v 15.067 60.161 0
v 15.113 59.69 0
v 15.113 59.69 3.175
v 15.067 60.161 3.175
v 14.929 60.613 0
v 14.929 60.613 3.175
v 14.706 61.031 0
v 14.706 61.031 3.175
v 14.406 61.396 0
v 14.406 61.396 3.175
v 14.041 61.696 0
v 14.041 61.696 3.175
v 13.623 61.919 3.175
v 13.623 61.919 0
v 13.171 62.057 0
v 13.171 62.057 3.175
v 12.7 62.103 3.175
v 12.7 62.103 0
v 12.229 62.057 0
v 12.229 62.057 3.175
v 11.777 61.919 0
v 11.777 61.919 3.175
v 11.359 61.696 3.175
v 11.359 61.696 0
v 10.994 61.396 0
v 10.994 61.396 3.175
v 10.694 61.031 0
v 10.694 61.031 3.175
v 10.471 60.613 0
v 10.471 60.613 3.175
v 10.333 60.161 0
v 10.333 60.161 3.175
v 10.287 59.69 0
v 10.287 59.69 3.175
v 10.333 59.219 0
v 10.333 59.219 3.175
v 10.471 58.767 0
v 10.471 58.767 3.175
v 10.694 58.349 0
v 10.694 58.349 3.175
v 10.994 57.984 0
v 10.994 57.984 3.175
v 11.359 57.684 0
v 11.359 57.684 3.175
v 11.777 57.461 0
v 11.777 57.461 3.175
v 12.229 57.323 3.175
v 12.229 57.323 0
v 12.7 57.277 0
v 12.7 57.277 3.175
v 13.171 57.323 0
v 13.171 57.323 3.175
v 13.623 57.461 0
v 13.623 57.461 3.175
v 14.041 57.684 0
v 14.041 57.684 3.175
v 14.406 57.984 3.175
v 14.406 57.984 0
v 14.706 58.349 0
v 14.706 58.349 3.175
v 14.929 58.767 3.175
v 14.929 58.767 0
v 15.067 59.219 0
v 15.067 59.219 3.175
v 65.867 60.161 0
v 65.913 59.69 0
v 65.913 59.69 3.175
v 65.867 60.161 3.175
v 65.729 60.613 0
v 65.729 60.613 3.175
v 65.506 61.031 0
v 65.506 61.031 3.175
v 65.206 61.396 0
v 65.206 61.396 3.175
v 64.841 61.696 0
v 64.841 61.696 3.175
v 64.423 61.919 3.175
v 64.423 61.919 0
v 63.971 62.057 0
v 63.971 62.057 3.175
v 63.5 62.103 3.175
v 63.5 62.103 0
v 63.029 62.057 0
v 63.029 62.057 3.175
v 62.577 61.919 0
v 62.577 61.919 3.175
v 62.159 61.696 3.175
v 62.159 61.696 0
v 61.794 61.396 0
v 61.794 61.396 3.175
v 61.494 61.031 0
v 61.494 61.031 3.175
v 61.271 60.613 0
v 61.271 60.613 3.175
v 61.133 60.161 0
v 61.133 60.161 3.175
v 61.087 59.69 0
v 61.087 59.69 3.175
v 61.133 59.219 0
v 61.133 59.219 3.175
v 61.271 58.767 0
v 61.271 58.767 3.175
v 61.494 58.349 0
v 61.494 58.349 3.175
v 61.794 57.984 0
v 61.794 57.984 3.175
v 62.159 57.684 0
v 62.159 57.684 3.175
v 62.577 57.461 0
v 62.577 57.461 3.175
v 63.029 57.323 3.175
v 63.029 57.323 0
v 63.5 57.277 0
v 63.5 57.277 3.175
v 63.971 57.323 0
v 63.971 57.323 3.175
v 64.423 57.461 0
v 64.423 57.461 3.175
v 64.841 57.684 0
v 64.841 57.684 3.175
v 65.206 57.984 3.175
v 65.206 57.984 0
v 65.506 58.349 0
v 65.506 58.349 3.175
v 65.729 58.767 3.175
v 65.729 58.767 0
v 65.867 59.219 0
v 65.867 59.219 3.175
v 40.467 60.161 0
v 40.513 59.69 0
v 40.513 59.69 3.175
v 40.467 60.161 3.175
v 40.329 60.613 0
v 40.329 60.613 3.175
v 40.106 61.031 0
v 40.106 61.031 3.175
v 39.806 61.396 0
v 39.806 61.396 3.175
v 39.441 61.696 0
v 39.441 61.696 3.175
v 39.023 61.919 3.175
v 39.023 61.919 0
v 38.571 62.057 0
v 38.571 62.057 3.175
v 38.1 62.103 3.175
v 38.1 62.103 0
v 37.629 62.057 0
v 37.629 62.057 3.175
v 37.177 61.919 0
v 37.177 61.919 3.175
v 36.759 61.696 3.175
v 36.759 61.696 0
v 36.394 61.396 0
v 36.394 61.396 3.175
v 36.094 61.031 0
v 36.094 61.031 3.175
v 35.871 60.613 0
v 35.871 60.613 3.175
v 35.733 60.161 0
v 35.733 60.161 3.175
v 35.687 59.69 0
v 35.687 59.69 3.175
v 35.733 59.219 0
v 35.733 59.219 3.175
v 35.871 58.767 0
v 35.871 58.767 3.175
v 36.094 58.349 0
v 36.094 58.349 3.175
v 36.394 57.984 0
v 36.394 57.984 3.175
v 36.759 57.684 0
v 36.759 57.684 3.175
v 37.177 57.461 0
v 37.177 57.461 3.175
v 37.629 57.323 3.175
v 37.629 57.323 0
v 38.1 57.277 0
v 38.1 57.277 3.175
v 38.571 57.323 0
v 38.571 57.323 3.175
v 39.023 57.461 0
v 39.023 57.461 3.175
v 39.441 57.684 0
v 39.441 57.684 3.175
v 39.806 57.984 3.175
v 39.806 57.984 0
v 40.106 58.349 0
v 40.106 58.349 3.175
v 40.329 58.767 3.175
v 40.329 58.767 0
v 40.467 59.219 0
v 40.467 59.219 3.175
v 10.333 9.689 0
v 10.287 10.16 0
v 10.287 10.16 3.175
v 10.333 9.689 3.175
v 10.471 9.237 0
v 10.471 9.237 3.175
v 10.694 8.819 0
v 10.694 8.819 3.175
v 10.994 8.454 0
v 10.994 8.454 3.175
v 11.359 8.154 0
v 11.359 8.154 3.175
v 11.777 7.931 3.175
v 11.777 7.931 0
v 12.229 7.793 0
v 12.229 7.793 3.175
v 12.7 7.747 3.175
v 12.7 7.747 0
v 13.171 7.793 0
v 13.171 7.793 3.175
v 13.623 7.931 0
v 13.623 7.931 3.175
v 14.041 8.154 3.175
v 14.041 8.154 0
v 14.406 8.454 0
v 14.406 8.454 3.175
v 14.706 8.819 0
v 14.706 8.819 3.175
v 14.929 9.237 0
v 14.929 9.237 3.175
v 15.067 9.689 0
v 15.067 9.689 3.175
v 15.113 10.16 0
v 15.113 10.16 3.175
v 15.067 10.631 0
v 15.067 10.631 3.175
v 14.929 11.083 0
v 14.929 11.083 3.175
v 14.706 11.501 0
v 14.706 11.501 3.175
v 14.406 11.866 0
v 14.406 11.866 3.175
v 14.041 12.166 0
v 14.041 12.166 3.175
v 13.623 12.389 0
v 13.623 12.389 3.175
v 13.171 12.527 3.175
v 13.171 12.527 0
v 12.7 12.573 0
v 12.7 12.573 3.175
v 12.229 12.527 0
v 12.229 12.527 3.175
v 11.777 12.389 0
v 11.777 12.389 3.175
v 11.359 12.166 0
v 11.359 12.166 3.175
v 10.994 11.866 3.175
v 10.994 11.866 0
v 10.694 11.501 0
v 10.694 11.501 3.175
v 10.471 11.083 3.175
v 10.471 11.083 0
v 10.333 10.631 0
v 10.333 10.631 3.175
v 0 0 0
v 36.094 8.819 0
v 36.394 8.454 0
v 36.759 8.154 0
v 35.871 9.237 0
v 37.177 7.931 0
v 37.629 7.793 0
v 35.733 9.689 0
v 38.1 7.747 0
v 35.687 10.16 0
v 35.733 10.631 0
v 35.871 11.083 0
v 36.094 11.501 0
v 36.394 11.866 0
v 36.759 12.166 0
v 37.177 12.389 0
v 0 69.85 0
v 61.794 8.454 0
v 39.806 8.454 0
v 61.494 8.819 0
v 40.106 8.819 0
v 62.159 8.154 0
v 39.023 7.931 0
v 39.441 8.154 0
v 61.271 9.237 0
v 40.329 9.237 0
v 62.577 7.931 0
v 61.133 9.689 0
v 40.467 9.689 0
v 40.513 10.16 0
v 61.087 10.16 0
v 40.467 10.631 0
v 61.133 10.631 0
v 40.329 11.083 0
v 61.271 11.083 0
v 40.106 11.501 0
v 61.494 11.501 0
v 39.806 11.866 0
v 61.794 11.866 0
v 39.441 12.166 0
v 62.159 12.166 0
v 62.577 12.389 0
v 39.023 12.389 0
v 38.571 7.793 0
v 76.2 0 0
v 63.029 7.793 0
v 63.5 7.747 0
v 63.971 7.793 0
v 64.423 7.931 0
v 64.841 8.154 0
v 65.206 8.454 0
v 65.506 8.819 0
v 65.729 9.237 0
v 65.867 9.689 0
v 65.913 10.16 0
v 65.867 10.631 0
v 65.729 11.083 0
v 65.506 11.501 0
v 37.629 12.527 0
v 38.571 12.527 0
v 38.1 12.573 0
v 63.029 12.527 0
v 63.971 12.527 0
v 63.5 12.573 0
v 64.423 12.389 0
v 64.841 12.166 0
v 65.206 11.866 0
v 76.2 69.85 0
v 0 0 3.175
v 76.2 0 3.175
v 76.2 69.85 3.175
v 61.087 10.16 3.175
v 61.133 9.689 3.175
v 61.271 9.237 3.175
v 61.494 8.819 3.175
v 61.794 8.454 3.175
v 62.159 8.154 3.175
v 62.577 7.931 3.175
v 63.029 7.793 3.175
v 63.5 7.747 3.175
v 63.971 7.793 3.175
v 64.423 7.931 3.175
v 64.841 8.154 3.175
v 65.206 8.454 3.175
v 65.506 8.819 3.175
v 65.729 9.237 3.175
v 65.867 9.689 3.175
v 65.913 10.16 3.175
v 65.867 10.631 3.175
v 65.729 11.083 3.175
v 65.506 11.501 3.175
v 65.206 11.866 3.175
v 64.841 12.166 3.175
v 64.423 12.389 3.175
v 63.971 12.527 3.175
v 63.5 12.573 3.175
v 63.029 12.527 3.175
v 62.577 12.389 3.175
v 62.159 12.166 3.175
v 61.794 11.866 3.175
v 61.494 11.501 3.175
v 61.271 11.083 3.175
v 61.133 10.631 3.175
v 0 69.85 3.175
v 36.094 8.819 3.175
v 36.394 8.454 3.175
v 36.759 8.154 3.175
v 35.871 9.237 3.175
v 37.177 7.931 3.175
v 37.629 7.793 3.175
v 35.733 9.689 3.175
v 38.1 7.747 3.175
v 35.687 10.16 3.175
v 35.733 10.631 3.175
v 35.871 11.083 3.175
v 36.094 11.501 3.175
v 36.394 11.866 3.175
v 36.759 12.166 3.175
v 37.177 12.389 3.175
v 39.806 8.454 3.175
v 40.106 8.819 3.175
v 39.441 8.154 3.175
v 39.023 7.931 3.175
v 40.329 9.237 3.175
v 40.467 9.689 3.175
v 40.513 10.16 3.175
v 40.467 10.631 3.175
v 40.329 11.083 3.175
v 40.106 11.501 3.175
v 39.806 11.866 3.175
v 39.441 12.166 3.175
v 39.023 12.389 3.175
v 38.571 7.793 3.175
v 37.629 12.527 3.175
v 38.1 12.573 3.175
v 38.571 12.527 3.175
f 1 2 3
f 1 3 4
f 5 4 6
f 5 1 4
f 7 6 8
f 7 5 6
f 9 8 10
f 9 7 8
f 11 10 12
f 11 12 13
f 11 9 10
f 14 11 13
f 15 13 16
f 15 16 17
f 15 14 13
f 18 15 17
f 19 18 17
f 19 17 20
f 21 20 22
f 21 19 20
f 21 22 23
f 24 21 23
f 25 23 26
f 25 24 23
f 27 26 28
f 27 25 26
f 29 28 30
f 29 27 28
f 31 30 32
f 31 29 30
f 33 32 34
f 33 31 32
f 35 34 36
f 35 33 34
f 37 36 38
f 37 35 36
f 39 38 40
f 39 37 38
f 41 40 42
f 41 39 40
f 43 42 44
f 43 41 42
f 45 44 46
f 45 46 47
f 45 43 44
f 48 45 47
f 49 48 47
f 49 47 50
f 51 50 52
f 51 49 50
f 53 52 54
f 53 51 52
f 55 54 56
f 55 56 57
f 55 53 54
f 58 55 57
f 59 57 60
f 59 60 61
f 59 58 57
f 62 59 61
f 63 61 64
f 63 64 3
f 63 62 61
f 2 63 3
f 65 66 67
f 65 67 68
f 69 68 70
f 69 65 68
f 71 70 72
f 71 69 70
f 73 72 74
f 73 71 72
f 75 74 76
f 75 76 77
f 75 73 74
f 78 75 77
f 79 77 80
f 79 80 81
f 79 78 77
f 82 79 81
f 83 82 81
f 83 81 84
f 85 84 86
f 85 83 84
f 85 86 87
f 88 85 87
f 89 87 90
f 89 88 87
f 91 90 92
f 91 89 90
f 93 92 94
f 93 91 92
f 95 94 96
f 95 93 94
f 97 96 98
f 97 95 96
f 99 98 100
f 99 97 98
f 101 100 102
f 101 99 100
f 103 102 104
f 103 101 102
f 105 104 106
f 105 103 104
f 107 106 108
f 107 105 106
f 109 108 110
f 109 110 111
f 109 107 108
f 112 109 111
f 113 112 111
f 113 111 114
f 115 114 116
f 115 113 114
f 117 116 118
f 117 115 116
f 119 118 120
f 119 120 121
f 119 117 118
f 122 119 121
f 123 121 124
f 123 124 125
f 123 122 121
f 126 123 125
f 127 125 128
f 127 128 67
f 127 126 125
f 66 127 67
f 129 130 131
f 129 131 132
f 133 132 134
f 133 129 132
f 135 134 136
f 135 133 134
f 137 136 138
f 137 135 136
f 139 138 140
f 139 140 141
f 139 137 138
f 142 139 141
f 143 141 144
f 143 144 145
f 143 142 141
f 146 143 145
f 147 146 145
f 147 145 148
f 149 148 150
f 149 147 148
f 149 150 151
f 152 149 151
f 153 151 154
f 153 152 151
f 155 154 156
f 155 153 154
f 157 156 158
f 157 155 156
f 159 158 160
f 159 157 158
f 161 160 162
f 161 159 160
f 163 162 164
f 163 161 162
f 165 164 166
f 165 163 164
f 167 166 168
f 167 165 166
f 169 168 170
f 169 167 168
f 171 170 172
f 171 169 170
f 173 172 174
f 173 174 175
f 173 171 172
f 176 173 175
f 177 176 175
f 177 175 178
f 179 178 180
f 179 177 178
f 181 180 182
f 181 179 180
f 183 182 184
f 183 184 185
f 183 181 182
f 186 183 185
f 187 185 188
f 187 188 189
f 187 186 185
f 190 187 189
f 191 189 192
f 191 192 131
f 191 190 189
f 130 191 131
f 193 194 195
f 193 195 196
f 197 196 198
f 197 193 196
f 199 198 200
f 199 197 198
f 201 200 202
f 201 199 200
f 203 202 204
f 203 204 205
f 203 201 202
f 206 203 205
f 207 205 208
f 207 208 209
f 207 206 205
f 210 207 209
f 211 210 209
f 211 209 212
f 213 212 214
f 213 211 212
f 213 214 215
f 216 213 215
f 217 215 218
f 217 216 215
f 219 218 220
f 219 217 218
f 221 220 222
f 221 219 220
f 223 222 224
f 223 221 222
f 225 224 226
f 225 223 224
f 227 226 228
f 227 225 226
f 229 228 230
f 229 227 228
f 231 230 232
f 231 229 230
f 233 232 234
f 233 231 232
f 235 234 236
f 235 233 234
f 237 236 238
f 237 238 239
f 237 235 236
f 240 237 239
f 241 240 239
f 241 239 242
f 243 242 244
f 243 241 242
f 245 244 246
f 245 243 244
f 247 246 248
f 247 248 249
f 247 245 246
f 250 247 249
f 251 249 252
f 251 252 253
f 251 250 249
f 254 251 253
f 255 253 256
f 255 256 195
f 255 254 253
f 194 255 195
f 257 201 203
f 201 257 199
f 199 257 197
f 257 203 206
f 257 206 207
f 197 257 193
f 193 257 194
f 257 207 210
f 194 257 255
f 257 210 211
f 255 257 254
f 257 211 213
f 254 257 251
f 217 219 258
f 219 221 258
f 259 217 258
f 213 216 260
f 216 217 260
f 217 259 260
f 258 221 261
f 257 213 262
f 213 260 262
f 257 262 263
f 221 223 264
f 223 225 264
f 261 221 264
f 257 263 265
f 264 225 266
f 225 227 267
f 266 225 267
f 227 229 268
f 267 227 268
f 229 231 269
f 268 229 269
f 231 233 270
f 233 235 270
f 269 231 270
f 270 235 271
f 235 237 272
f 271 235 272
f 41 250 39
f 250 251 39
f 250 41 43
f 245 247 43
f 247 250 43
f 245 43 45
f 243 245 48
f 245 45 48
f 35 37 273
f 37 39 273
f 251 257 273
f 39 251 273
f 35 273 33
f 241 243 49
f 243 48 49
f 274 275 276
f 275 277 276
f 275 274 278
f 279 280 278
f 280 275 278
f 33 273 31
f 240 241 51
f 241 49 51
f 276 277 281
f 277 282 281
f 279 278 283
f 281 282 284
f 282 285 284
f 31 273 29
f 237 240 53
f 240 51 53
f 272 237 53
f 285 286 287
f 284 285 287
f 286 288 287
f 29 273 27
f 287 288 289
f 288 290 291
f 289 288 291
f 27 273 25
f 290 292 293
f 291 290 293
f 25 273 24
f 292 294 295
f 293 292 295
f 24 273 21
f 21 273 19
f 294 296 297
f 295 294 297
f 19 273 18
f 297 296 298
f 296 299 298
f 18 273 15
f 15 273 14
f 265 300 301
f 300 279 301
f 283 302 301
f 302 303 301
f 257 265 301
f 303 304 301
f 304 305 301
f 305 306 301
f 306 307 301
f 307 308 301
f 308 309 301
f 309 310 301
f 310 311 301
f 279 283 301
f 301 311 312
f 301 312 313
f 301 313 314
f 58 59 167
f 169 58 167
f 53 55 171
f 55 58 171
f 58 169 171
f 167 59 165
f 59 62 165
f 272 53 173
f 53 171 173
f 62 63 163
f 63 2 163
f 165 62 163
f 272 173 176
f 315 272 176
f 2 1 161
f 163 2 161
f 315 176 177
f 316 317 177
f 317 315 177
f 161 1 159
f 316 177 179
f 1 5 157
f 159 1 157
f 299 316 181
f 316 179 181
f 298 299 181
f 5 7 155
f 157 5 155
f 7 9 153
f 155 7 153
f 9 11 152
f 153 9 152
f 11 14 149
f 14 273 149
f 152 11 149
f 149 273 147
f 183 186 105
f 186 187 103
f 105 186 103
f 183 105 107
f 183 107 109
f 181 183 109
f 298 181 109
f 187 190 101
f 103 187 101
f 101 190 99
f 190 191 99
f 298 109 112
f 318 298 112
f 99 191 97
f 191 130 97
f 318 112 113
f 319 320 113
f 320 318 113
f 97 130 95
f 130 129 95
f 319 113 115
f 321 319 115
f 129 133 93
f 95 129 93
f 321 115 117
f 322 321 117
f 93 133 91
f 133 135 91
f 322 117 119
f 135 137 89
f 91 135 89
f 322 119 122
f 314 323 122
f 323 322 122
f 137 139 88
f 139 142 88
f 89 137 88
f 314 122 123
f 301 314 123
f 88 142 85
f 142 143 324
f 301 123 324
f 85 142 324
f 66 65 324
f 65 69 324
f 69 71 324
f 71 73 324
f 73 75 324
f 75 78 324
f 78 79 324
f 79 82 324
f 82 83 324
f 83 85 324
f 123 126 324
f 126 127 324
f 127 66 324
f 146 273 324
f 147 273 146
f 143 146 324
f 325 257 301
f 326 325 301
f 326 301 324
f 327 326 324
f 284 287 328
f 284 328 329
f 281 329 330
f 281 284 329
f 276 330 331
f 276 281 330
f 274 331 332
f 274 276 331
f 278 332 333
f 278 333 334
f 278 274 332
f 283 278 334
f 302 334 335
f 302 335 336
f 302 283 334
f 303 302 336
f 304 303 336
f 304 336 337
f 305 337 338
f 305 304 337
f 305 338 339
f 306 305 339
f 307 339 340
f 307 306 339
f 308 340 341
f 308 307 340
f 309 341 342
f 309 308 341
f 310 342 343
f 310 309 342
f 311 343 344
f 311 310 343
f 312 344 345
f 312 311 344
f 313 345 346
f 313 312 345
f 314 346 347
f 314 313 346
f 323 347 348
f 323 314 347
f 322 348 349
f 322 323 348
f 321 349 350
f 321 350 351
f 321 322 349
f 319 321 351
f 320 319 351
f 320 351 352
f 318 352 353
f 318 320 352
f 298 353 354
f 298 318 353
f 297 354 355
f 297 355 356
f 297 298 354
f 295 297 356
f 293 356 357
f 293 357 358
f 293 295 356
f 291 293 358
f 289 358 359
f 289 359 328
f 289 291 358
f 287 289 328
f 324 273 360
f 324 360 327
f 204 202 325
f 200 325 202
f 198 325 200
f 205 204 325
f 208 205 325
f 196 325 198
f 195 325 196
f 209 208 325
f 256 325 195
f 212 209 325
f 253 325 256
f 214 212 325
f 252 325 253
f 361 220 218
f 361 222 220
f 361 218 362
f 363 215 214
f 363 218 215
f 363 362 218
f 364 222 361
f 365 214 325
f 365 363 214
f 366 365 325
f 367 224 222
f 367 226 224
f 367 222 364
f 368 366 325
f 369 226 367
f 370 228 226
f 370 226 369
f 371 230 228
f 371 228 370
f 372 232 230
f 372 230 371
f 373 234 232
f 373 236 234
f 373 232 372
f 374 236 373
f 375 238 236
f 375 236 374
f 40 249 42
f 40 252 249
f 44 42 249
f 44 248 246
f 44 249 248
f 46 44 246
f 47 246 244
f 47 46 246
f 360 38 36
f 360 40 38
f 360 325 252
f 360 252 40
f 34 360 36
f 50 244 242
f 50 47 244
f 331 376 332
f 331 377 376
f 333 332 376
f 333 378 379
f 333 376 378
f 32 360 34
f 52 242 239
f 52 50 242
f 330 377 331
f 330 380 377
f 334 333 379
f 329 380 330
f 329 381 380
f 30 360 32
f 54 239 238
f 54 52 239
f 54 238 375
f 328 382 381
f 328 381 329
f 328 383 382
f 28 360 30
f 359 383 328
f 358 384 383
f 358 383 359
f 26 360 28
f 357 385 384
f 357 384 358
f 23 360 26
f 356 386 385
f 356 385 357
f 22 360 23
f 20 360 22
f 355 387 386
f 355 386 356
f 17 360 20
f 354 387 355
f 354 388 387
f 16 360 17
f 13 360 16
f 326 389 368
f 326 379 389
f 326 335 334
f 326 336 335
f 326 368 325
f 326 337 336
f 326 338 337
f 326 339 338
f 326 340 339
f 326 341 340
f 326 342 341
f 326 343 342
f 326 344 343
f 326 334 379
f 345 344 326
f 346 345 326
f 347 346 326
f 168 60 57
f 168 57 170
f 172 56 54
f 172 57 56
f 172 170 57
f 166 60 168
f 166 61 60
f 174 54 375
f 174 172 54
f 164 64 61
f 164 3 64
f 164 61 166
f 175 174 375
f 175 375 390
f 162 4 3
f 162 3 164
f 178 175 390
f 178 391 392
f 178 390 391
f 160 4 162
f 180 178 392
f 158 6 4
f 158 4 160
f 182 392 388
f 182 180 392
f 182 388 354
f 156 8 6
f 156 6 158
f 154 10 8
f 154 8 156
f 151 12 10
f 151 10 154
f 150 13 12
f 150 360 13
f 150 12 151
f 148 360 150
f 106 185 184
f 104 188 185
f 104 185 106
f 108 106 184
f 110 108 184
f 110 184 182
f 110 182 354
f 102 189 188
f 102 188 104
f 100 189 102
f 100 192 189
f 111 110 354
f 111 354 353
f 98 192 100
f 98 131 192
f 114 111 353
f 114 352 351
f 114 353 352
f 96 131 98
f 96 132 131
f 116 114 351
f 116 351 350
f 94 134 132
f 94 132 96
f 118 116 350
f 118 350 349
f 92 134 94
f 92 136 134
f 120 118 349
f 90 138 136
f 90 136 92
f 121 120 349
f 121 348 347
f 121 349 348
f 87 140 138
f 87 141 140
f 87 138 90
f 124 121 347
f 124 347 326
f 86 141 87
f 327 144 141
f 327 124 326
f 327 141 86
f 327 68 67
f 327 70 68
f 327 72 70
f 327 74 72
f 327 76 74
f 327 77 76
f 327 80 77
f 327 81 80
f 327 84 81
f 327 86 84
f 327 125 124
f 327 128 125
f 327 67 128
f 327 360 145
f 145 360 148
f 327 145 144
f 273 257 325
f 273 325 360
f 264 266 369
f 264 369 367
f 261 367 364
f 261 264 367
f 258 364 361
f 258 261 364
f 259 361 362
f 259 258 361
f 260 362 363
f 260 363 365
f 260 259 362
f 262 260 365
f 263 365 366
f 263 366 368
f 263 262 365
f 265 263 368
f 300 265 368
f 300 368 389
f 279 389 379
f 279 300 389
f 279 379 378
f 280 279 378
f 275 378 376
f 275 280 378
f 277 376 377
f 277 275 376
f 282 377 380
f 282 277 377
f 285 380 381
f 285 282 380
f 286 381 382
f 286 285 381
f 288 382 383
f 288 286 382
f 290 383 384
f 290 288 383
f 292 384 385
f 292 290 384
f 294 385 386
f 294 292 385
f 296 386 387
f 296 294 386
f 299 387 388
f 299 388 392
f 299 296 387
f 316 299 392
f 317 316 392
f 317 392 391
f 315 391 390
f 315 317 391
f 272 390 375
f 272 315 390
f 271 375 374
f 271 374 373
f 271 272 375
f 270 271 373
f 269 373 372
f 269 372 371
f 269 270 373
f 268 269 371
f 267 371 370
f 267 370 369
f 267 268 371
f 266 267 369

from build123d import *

# Parameters (mm, degrees)
SKETCH1_W           = 76.2
SKETCH1_H           = 69.85
SKETCH1_R           = 2.413
BOSS_EXTRUDE1_DEPTH = 3.175


with BuildPart() as part:
    # Sketch1 → Boss-Extrude1 (new body)
    with BuildSketch(Plane.XY):
        with Locations((38.1, 34.925)):
            Rectangle(SKETCH1_W, SKETCH1_H)
        with Locations((12.7, 59.69)):
            Circle(SKETCH1_R, mode=Mode.SUBTRACT)
        with Locations((38.1, 59.69)):
            Circle(SKETCH1_R, mode=Mode.SUBTRACT)
        with Locations((63.5, 59.69)):
            Circle(SKETCH1_R, mode=Mode.SUBTRACT)
        with Locations(Location((63.5, 10.16, 0), (0, 0, 180))):
            Circle(SKETCH1_R, mode=Mode.SUBTRACT)
        with Locations(Location((38.1, 10.16, 0), (0, 0, 180))):
            Circle(SKETCH1_R, mode=Mode.SUBTRACT)
        with Locations(Location((12.7, 10.16, 0), (0, 0, 180))):
            Circle(SKETCH1_R, mode=Mode.SUBTRACT)
    extrude(amount=BOSS_EXTRUDE1_DEPTH)


solid = part.part
